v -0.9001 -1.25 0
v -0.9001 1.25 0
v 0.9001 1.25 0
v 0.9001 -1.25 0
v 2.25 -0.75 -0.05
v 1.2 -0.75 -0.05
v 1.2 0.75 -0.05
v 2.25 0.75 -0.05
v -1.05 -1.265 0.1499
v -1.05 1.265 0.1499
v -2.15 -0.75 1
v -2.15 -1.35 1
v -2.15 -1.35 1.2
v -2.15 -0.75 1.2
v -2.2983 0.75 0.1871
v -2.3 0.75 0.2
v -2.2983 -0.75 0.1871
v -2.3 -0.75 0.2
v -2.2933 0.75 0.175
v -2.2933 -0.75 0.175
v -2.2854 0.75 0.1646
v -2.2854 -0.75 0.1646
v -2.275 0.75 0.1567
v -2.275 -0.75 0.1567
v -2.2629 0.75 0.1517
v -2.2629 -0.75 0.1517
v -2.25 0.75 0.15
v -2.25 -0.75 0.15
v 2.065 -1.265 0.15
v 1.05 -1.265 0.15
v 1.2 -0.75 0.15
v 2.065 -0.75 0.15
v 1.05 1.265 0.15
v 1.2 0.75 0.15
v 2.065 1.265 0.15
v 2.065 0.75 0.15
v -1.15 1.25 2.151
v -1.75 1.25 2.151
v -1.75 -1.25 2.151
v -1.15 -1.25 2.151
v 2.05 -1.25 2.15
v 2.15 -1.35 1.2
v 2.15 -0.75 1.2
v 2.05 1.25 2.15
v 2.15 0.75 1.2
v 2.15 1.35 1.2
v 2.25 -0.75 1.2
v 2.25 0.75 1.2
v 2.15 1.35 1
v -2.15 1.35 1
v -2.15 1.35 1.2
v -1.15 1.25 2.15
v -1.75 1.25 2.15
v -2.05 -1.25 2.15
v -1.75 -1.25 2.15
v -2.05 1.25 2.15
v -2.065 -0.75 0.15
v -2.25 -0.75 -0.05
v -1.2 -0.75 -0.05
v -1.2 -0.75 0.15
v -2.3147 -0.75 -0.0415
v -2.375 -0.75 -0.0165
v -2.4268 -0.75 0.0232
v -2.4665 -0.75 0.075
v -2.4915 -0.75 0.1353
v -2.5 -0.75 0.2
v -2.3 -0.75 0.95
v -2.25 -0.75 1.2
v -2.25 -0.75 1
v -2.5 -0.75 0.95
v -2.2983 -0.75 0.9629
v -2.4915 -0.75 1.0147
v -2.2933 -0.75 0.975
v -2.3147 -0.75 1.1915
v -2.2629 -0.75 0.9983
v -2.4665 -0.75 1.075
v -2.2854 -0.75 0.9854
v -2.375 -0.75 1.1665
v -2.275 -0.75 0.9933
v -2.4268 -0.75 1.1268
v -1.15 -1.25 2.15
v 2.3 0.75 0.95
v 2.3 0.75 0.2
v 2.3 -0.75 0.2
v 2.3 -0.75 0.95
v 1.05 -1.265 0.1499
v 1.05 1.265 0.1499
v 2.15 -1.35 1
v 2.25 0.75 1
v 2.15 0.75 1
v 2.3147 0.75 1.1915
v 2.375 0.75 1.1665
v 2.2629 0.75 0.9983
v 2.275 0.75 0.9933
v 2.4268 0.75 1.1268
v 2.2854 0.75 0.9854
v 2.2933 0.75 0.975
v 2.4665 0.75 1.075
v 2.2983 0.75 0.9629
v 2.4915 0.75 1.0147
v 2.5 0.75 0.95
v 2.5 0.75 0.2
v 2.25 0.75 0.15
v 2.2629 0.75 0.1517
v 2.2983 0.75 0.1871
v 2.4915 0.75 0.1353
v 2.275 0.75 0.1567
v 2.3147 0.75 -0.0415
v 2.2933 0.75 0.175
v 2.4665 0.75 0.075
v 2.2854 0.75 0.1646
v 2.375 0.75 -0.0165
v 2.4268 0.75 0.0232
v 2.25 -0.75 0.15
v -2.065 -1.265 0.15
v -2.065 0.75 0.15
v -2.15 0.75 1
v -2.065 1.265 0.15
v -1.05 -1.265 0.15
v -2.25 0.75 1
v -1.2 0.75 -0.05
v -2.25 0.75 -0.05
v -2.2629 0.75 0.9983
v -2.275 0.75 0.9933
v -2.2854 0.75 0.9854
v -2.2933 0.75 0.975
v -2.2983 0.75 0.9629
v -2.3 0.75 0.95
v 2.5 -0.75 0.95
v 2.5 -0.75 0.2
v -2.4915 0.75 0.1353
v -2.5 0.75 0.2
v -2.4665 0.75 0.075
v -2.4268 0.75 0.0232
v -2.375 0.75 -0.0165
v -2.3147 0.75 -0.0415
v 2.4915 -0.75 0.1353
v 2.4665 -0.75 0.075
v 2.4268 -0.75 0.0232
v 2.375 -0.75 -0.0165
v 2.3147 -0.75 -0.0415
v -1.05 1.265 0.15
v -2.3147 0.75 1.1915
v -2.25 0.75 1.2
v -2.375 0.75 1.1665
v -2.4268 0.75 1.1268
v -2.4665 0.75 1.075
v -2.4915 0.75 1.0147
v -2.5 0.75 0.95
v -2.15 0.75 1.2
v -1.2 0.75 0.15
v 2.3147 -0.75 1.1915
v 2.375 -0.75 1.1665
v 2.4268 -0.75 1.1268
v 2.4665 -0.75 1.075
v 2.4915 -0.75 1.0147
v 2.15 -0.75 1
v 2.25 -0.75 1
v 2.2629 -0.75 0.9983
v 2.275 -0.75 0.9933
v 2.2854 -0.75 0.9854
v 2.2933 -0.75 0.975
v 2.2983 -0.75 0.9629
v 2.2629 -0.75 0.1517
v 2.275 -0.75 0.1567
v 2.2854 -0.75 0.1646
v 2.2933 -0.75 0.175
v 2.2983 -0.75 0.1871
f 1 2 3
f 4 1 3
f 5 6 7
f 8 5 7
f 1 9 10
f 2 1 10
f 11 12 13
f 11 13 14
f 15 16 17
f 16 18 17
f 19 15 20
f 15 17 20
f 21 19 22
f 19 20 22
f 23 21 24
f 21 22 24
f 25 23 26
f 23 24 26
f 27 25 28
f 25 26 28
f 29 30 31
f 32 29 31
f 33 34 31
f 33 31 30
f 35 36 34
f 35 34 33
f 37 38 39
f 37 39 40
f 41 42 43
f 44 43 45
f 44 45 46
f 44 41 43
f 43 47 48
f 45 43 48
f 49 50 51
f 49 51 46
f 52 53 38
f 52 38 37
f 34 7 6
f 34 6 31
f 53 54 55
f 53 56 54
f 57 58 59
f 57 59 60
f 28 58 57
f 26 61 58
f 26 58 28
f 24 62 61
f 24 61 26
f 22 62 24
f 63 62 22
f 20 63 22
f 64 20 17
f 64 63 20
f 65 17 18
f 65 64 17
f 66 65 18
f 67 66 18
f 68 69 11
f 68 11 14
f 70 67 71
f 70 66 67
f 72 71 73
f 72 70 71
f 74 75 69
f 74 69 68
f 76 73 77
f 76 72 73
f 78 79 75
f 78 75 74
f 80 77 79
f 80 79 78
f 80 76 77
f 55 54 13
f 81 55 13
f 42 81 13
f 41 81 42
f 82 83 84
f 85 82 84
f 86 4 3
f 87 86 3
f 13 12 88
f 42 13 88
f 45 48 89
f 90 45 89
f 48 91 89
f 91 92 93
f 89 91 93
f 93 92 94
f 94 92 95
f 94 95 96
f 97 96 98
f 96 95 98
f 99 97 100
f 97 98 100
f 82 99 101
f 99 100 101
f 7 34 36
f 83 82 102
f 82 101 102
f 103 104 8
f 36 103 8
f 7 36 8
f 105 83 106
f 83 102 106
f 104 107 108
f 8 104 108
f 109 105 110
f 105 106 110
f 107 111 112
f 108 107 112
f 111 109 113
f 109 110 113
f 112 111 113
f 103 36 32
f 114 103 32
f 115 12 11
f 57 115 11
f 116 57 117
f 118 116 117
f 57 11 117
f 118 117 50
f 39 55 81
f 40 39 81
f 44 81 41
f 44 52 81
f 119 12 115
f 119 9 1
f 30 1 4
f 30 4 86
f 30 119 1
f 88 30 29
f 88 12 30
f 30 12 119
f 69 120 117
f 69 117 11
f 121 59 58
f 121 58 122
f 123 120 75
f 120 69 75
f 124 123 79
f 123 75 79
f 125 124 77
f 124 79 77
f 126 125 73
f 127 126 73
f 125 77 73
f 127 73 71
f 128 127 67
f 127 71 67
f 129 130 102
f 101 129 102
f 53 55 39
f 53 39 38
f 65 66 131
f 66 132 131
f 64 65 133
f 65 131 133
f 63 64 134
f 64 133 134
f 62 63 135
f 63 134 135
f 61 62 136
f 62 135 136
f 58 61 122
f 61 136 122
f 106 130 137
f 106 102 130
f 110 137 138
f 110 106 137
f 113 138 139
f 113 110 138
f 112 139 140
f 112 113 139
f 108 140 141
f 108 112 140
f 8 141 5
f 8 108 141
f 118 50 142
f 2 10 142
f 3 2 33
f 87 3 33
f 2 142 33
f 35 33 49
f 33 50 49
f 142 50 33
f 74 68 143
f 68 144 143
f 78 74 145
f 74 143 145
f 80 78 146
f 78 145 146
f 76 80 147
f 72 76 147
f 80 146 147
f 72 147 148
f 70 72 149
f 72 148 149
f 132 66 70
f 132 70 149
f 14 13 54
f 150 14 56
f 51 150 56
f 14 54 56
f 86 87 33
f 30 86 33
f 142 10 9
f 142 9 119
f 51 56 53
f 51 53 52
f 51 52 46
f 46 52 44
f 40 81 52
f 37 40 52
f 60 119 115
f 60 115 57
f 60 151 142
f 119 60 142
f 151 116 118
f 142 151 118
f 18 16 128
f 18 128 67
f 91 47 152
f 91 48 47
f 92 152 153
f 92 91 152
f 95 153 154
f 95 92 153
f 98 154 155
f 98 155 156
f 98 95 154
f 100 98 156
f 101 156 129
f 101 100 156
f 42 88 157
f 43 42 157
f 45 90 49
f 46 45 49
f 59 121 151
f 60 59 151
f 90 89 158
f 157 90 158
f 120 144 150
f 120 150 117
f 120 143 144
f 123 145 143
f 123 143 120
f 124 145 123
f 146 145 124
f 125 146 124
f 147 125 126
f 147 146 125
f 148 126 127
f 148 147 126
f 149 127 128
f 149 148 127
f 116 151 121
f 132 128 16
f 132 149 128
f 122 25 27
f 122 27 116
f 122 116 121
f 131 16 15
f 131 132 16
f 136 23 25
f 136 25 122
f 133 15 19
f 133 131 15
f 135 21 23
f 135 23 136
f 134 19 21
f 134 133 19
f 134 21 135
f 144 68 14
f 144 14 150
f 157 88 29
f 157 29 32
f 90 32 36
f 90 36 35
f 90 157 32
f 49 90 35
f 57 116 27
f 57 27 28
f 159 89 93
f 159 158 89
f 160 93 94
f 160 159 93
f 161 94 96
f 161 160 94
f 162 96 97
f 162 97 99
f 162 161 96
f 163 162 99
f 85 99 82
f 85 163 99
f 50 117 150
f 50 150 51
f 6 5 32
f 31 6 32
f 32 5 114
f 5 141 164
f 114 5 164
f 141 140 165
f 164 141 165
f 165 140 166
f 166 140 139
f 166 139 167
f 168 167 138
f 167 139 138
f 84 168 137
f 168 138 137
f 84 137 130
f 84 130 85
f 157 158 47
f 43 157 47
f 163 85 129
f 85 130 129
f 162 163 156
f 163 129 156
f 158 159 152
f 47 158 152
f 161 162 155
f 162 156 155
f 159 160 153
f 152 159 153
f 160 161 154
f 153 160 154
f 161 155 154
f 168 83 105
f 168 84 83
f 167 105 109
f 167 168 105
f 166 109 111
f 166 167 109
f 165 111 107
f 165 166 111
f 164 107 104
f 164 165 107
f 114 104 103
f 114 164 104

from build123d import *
from OCP.BRepFilletAPI import BRepFilletAPI_MakeChamfer

# Parameters (mm, degrees)
SZKIC1_W                    = 4.3
SZKIC1_H                    = 2.7
DODANIE_WYCI_GNI_CIE1_DEPTH = 2.15
SFAZOWANIE1_SIZE            = 0.95
SFAZOWANIE1_SIZE2           = 0.1
SFAZOWANIE2_SIZE            = 0.1
SFAZOWANIE2_SIZE2           = 1
SZKIC2_W                    = 0.6
SZKIC2_H                    = 2.5
DODANIE_WYCI_GNI_CIE2_DEPTH = 0.001
SZKIC3_W                    = 0.15
SZKIC3_H                    = 2.7
WYTNIJ_WYCI_GNI_CIE1_DEPTH  = 1.1
SFAZOWANIE3_SIZE            = 0.15
SZKIC4_W                    = 0.2
SZKIC4_H                    = 1.5
SFAZOWANIE3_OF_LUSTRO1_SIZE = 0.15


with BuildPart() as part:
    # Szkic1 → Dodanie-wyciągnięcie1 (new body)
    with BuildSketch(Plane.XY):
        Rectangle(SZKIC1_W, SZKIC1_H)
    extrude(amount=DODANIE_WYCI_GNI_CIE1_DEPTH)

    # Sfazowanie1: one chamfer whose edges measure the first distance from different faces: ONE call of the kernel's chamfer builder (chamfer() names one face for all edges)
    sfazowanie1_edges_1 = [part.edges().sort_by_distance(p)[0] for p in [
        (2.15, 0, 2.15),
    ]]
    sfazowanie1_side_1 = [part.faces().sort_by_distance(p)[0] for p in [
        (2.15, 0, 1.075),
    ]]
    sfazowanie1_edges_2 = [part.edges().sort_by_distance(p)[0] for p in [
        (0, 1.35, 2.15),
    ]]
    sfazowanie1_side_2 = [part.faces().sort_by_distance(p)[0] for p in [
        (0, 1.35, 1.075),
    ]]
    sfazowanie1_edges_3 = [part.edges().sort_by_distance(p)[0] for p in [
        (-2.15, 0, 2.15),
    ]]
    sfazowanie1_side_3 = [part.faces().sort_by_distance(p)[0] for p in [
        (-2.15, 0, 1.075),
    ]]
    sfazowanie1_edges_4 = [part.edges().sort_by_distance(p)[0] for p in [
        (0, -1.35, 2.15),
    ]]
    sfazowanie1_side_4 = [part.faces().sort_by_distance(p)[0] for p in [
        (0, -1.35, 1.075),
    ]]
    sfazowanie1 = BRepFilletAPI_MakeChamfer(part.part.solid().wrapped)
    for e in sfazowanie1_edges_1:
        sfazowanie1.Add(SFAZOWANIE1_SIZE, SFAZOWANIE1_SIZE2, e.wrapped, sfazowanie1_side_1[0].wrapped)  # the first distance lies on this face
    for e in sfazowanie1_edges_2:
        sfazowanie1.Add(SFAZOWANIE1_SIZE, SFAZOWANIE1_SIZE2, e.wrapped, sfazowanie1_side_2[0].wrapped)  # the first distance lies on this face
    for e in sfazowanie1_edges_3:
        sfazowanie1.Add(SFAZOWANIE1_SIZE, SFAZOWANIE1_SIZE2, e.wrapped, sfazowanie1_side_3[0].wrapped)  # the first distance lies on this face
    for e in sfazowanie1_edges_4:
        sfazowanie1.Add(SFAZOWANIE1_SIZE, SFAZOWANIE1_SIZE2, e.wrapped, sfazowanie1_side_4[0].wrapped)  # the first distance lies on this face
    add(Compound.cast(sfazowanie1.Shape()), mode=Mode.REPLACE)

    # Sfazowanie2
    sfazowanie2_edges = [part.edges().sort_by_distance(p)[0] for p in [
        (0, 1.35, 0),
        (2.15, 0, 0),
        (0, -1.35, 0),
        (-2.15, 0, 0),
    ]]
    sfazowanie2_side = [part.faces().sort_by_distance(p)[0] for p in [
        (0, 0, 0),
    ]]
    chamfer(sfazowanie2_edges, length=SFAZOWANIE2_SIZE, length2=SFAZOWANIE2_SIZE2, reference=sfazowanie2_side[0])

    # Szkic2 → Dodanie-wyciągnięcie2 (add)
    with BuildSketch(Plane.XY.offset(2.15)):
        with Locations((-1.45, 0)):
            Rectangle(SZKIC2_W, SZKIC2_H)
    extrude(amount=DODANIE_WYCI_GNI_CIE2_DEPTH)

    # Szkic3 → Wytnij-wyciągnięcie1 (cut)
    with BuildSketch(Plane.ZY.offset(2.15)):
        with Locations((0.075, 0)):
            Rectangle(SZKIC3_W, SZKIC3_H)
    wytnij_wyci_gni_cie1 = extrude(amount=-WYTNIJ_WYCI_GNI_CIE1_DEPTH, mode=Mode.SUBTRACT)

    # Sfazowanie3
    sfazowanie3_edges = [part.edges().sort_by_distance(p)[0] for p in [
        (-1.05, 0, 0),
    ]]
    chamfer(sfazowanie3_edges, length=SFAZOWANIE3_SIZE - 0.0001)  # a hair under: the kernel refuses the full size

    # Wyciągnięcie po ścieżce2: sweep along a path in Szkic6
    with BuildLine(Plane(origin=(0, 0, 0), x_dir=(1, 0, 0), z_dir=(0, 1, 0))) as wyci_gni_cie_po_cie_ce2_path:
        Line((-2.15, -1.2), (-2.25, -1.2))
        ThreePointArc((-2.25, -1.2), (-2.426776695, -1.126776695), (-2.5, -0.95))
        Line((-2.5, -0.95), (-2.5, -0.2))
        ThreePointArc((-2.5, -0.2), (-2.426776695, -0.023223305), (-2.25, 0.05))
        Line((-2.25, 0.05), (-1.2, 0.05))
    # Szkic4 → Wyciągnięcie po ścieżce2 (sweep)
    with BuildSketch(Plane.ZY.offset(2.15)):
        with Locations((1.1, 0)):
            Rectangle(SZKIC4_W, SZKIC4_H)
    wyci_gni_cie_po_cie_ce2 = sweep(path=wyci_gni_cie_po_cie_ce2_path.line)

    # Lustro1: Wytnij-wyciągnięcie1, Wyciągnięcie po ścieżce2 across plane
    add(wytnij_wyci_gni_cie1.mirror(Plane(origin=(0, 0, 0), x_dir=(0, 0, 1), z_dir=(1, 0, 0))), mode=Mode.SUBTRACT)
    add(wyci_gni_cie_po_cie_ce2.mirror(Plane(origin=(0, 0, 0), x_dir=(0, 0, 1), z_dir=(1, 0, 0))))

    # Sfazowanie3 of Lustro1
    sfazowanie3_of_lustro1_edges = [part.edges().sort_by_distance(p)[0] for p in [
        (1.05, 0, 0),
    ]]
    chamfer(sfazowanie3_of_lustro1_edges, length=SFAZOWANIE3_OF_LUSTRO1_SIZE - 0.0001)  # a hair under: the kernel refuses the full size


solid = part.part
